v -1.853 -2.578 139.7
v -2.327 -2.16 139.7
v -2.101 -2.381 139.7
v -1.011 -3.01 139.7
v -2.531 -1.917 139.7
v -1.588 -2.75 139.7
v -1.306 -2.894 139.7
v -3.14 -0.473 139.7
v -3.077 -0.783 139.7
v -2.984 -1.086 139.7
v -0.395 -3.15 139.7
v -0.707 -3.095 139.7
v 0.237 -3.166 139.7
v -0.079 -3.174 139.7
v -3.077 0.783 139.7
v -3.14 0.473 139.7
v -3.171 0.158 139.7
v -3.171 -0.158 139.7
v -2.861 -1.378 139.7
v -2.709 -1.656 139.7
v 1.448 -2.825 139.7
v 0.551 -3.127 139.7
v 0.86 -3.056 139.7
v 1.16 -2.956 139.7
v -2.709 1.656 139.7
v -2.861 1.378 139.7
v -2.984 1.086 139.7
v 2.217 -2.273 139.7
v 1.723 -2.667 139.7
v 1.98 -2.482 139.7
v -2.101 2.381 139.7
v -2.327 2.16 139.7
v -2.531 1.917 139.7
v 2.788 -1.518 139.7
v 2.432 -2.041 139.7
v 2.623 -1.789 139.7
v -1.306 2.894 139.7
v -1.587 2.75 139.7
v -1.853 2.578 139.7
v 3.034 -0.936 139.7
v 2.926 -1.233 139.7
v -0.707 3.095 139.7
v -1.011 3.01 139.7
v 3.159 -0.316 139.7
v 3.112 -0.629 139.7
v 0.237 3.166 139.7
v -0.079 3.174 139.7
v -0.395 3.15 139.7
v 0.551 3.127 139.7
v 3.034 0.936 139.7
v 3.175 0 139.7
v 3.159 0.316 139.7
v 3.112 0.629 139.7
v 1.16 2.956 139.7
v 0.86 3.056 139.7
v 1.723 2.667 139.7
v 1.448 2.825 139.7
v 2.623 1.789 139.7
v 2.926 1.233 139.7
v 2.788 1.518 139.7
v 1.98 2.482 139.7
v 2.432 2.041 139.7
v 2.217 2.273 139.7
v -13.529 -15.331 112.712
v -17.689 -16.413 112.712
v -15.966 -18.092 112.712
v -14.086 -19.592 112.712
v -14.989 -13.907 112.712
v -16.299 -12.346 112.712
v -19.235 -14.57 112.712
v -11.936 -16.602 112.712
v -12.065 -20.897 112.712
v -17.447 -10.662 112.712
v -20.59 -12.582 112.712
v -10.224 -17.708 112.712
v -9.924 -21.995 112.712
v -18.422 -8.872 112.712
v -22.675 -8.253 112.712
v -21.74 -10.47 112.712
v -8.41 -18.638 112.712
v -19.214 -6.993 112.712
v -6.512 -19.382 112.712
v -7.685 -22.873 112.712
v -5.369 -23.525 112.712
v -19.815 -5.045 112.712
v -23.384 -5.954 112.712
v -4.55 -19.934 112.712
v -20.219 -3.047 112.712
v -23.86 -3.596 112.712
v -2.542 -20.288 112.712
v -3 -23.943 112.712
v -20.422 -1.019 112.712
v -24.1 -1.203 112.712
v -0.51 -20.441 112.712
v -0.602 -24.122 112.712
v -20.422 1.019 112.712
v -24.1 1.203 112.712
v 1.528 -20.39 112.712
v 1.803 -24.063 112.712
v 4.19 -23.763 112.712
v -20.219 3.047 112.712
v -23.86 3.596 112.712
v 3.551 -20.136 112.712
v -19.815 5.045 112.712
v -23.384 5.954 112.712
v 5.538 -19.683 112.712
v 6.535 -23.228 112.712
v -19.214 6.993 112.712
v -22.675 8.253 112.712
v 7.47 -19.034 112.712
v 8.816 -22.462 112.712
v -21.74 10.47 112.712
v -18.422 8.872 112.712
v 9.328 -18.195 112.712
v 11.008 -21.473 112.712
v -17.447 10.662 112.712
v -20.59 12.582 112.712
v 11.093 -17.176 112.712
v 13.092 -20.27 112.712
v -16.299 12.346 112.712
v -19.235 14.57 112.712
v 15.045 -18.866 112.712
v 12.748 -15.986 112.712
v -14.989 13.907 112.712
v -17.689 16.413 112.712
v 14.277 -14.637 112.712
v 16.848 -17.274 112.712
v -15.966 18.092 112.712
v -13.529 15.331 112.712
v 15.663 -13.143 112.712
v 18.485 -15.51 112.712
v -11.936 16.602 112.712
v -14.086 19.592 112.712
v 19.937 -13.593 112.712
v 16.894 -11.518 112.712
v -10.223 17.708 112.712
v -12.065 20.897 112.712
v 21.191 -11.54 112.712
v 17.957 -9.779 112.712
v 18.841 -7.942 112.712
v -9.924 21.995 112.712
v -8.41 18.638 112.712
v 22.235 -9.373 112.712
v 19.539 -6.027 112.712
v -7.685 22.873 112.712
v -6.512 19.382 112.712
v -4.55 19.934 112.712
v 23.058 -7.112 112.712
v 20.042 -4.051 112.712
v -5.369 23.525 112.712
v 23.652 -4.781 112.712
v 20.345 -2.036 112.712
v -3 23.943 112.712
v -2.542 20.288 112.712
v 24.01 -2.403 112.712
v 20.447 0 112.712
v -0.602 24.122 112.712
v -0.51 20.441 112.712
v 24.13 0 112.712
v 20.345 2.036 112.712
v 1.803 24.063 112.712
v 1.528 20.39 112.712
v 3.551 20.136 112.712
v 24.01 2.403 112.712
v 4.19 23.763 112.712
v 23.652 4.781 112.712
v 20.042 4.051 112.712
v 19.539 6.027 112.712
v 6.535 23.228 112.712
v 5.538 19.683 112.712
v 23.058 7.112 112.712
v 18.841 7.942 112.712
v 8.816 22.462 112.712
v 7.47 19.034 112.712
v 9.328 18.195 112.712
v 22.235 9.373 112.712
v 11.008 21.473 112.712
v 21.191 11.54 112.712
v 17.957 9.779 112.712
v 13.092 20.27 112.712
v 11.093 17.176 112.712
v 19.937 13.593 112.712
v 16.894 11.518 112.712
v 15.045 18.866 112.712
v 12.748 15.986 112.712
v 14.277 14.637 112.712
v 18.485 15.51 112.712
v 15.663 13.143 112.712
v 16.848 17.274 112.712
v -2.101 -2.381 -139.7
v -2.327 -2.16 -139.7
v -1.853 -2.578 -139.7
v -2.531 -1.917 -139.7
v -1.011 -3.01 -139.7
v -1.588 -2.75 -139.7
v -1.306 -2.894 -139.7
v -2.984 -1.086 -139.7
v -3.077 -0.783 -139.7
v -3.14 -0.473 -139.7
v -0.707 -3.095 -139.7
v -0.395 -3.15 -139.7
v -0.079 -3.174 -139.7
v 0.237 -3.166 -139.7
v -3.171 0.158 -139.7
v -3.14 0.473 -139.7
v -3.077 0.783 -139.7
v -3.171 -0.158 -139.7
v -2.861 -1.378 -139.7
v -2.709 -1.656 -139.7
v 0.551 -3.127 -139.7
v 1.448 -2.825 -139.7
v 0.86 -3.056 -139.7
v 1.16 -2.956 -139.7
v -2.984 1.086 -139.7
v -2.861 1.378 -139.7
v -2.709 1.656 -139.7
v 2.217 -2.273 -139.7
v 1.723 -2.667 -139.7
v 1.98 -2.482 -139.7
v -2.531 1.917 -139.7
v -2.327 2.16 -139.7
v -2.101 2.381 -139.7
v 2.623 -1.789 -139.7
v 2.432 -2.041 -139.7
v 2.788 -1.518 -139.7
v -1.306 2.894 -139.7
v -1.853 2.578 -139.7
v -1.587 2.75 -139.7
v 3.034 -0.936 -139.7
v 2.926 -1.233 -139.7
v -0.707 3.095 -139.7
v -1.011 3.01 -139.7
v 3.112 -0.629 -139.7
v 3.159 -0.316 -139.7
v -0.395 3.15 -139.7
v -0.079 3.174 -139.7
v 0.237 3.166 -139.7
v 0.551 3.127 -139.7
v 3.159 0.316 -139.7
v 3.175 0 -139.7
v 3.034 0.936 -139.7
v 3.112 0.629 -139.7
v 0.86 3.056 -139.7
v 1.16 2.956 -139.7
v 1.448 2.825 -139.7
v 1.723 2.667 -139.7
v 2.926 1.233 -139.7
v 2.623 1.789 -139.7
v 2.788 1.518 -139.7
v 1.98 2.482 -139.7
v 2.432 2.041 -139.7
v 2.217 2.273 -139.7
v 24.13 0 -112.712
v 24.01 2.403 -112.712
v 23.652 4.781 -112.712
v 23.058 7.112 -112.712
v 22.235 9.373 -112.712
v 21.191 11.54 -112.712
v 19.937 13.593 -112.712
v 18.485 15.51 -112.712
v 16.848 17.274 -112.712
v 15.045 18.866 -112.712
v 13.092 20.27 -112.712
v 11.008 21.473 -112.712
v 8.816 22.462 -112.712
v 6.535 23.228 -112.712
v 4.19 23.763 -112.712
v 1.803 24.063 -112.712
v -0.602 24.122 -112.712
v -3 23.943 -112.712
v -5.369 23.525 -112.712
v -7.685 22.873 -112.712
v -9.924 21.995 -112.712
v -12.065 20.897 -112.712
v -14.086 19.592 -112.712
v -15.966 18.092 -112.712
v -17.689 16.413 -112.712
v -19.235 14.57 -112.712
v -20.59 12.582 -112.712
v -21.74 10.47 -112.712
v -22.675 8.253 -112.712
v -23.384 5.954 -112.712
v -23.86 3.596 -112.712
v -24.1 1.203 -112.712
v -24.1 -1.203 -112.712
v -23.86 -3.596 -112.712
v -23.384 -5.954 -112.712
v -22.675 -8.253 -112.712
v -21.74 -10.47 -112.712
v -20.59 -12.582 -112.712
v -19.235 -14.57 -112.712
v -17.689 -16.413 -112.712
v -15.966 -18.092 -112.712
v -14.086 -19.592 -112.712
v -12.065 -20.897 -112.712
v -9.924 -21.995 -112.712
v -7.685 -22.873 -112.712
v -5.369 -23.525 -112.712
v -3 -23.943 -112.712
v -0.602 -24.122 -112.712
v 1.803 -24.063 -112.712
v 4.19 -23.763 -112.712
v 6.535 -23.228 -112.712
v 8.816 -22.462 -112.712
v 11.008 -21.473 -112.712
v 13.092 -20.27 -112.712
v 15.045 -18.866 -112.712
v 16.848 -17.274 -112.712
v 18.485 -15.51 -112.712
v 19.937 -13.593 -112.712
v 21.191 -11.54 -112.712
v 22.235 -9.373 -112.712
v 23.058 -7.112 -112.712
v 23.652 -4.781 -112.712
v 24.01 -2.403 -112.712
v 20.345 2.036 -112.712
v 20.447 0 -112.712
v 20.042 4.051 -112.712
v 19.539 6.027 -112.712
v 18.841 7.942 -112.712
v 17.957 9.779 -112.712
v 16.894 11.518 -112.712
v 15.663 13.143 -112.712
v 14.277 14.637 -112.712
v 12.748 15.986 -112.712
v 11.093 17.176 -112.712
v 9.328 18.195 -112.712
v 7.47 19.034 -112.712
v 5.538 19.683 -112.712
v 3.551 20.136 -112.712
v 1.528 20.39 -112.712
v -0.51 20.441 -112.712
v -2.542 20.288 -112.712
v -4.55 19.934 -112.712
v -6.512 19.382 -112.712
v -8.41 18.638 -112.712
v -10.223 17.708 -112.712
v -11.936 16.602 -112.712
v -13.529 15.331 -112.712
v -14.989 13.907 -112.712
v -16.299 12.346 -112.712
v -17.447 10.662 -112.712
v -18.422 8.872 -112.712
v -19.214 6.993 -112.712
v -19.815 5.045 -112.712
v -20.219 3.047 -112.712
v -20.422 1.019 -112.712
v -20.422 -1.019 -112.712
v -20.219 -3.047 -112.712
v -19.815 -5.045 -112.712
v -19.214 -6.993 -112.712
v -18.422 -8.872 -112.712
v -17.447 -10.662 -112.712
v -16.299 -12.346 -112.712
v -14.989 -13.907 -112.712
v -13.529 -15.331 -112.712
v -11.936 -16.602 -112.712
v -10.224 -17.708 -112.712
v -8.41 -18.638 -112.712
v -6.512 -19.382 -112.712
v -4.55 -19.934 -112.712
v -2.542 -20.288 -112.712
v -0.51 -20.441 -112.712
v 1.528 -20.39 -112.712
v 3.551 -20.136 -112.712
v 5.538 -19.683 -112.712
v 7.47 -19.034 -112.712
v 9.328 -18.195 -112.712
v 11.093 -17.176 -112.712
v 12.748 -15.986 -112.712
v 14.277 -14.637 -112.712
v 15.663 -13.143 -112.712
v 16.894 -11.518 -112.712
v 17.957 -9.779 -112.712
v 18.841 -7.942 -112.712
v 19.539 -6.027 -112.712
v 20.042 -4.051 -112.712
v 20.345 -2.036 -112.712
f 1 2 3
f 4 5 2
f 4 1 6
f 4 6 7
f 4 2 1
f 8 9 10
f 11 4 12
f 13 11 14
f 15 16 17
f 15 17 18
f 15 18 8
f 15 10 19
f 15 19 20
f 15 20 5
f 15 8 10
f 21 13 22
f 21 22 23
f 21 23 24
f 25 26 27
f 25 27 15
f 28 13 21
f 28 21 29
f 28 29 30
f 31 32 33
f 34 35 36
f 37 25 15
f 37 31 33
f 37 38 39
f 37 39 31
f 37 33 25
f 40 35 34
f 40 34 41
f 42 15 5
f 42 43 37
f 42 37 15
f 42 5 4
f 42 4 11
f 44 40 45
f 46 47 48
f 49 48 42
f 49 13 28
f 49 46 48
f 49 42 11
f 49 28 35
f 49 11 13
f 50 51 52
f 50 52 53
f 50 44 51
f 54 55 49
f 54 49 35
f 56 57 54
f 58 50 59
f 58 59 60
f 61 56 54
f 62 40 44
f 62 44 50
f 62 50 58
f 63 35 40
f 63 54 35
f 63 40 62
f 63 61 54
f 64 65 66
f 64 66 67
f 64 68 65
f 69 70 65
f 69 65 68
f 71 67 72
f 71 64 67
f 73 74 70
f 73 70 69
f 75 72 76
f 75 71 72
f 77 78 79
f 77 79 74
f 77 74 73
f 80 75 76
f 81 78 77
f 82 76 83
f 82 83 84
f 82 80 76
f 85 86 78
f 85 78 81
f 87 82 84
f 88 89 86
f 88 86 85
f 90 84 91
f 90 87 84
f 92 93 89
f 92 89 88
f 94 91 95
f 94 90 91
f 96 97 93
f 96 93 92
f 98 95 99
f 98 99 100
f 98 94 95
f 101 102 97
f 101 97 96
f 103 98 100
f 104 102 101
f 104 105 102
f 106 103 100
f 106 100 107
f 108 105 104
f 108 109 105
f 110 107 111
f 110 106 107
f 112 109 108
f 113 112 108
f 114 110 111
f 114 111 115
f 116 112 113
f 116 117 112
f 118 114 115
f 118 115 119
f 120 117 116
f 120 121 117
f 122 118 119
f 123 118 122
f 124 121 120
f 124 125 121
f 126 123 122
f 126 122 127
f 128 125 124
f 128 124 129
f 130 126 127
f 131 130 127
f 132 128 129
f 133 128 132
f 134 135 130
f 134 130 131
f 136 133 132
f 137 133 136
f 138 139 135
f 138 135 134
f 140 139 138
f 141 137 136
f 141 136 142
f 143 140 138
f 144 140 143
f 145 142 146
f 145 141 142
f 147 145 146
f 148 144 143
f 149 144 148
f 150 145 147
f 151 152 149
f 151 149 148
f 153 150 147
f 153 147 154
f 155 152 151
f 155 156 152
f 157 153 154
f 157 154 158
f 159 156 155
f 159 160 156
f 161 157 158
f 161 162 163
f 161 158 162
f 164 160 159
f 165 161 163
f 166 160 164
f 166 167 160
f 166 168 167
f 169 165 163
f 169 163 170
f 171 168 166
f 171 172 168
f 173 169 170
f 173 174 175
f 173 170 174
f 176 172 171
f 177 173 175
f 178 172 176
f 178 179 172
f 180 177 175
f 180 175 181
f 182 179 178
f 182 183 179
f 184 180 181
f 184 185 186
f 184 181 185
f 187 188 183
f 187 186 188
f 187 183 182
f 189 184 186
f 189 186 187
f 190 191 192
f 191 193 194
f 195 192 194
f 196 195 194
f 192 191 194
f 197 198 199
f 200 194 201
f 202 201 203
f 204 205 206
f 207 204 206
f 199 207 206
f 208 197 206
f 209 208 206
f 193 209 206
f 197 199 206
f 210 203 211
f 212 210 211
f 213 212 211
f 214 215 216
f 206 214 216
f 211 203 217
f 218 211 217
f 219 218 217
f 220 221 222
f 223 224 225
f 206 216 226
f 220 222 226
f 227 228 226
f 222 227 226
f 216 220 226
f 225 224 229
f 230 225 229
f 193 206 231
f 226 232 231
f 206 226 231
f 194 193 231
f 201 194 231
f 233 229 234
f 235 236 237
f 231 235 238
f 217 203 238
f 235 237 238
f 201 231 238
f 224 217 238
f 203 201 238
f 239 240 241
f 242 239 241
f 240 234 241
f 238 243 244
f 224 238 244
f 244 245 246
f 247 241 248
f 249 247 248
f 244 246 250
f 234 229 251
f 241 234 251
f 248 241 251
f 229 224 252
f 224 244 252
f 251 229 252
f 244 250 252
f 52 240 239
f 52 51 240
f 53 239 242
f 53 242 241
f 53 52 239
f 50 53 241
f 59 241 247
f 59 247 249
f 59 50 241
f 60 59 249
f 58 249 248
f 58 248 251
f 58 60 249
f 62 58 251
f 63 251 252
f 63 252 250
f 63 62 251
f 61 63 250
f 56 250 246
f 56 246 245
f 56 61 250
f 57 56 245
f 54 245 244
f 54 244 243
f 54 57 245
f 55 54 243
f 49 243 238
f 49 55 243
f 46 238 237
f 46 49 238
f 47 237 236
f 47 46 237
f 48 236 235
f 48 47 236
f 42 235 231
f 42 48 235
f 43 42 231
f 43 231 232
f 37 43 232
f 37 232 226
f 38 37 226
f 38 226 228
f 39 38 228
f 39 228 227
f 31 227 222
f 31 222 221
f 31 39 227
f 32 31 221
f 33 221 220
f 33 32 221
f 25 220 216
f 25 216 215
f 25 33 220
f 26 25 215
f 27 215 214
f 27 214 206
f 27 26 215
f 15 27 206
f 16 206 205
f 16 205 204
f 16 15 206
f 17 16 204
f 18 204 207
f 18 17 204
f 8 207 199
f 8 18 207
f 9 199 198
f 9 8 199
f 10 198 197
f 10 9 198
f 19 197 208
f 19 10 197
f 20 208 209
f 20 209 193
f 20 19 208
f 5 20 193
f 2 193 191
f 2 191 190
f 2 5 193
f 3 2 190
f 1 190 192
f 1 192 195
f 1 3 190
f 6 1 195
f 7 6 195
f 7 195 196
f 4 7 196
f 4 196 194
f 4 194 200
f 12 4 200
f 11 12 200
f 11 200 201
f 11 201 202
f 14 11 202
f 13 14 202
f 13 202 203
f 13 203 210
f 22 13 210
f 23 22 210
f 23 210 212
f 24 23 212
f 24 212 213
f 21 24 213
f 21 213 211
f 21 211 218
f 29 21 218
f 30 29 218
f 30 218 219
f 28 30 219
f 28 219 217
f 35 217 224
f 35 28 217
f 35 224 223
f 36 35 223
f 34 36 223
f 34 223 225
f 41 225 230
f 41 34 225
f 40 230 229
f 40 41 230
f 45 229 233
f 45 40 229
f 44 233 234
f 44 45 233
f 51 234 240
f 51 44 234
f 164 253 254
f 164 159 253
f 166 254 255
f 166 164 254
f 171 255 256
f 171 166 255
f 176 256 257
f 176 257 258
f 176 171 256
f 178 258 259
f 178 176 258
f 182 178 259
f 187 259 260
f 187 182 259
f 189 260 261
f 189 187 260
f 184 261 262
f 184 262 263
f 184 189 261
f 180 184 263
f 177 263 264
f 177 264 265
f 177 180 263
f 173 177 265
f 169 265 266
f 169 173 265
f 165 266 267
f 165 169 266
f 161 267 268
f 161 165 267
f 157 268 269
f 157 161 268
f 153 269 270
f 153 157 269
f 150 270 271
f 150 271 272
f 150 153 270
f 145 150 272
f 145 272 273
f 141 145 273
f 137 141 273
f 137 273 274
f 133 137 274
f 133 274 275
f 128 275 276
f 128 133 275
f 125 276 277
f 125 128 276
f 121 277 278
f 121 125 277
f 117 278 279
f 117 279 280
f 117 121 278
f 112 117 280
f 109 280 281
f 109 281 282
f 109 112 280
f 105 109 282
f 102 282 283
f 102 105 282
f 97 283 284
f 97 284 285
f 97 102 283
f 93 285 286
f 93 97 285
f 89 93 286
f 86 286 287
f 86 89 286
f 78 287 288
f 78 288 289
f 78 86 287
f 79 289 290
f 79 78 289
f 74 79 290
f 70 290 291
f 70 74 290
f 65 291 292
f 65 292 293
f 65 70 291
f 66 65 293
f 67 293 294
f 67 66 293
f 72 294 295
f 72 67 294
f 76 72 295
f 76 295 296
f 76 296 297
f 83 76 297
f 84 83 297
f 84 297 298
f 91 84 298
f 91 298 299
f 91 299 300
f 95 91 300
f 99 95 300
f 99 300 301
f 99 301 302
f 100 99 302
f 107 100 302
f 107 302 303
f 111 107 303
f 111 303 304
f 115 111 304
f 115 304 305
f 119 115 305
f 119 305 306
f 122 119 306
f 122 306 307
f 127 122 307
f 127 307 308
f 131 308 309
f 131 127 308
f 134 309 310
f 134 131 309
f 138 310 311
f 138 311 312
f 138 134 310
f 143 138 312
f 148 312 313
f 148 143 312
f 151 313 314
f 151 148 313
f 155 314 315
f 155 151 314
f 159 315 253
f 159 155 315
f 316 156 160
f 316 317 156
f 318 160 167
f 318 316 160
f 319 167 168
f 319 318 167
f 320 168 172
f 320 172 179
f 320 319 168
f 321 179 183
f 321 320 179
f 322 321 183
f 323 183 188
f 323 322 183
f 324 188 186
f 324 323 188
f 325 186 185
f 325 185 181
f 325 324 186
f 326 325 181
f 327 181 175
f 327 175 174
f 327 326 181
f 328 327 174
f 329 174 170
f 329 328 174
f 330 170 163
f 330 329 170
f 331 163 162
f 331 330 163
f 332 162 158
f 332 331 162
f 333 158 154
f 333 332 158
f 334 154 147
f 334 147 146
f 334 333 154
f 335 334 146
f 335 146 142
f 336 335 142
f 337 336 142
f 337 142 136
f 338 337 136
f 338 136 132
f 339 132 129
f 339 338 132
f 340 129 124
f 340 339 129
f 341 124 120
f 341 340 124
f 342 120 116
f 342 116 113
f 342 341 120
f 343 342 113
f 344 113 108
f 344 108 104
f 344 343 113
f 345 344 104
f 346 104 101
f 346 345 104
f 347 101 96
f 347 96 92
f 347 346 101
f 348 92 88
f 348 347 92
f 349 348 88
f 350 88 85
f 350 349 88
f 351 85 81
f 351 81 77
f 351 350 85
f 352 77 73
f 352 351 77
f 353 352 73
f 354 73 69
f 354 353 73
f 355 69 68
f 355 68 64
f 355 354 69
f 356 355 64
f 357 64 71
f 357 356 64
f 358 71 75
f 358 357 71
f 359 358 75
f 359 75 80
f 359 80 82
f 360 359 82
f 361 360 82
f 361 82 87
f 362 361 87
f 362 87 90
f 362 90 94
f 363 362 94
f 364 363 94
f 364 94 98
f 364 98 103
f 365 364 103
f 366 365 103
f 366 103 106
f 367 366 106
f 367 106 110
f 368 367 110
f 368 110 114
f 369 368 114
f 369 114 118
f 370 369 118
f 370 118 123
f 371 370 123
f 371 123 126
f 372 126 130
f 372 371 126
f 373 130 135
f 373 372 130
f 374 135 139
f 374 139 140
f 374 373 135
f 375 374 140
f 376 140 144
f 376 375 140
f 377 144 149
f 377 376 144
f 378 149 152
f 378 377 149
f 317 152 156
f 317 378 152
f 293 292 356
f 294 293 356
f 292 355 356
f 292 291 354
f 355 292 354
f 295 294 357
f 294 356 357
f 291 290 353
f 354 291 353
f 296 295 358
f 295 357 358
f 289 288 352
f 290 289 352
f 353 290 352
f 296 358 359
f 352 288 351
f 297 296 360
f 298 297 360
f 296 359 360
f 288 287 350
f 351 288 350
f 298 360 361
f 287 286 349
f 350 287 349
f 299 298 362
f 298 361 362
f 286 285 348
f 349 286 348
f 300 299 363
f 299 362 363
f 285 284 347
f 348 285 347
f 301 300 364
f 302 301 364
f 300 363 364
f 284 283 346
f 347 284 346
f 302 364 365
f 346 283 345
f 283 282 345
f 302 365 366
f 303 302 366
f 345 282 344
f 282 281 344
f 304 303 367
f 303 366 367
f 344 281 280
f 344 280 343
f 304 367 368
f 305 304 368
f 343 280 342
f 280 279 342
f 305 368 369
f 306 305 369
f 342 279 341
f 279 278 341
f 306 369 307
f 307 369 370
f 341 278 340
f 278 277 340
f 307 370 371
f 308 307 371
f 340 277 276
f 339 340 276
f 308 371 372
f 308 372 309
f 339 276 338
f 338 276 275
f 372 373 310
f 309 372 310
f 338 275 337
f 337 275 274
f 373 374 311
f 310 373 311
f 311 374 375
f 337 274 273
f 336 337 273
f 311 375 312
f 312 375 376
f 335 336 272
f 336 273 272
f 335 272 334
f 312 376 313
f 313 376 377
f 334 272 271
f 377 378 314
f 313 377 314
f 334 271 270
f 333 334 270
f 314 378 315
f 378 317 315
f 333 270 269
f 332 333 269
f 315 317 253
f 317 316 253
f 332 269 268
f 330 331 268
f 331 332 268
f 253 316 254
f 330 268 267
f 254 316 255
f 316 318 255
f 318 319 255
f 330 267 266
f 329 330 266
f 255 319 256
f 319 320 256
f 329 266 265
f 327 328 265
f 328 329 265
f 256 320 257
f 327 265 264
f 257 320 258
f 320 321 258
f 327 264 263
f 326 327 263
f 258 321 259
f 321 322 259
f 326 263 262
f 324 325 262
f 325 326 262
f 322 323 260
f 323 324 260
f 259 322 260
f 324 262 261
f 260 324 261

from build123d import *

# Parameters (mm, degrees)
SKETCH1_R           = 3.175
BOSS_EXTRUDE1_DEPTH = 139.7
SKETCH2_R           = 24.13
SKETCH2_R_2         = 20.447
BOSS_EXTRUDE2_DEPTH = 112.7125


with BuildPart() as part:
    # Sketch1 → Boss-Extrude1 (new body, symmetric)
    with BuildSketch(Plane.XY):
        Circle(SKETCH1_R)
    extrude(amount=BOSS_EXTRUDE1_DEPTH, both=True)


with BuildPart() as body_2:
    # Sketch2 → Boss-Extrude2 (new body, symmetric)
    with BuildSketch(Plane.XY):
        Circle(SKETCH2_R)
        Circle(SKETCH2_R_2, mode=Mode.SUBTRACT)
    extrude(amount=BOSS_EXTRUDE2_DEPTH, both=True)


solid = Compound([part.part, body_2.part])
